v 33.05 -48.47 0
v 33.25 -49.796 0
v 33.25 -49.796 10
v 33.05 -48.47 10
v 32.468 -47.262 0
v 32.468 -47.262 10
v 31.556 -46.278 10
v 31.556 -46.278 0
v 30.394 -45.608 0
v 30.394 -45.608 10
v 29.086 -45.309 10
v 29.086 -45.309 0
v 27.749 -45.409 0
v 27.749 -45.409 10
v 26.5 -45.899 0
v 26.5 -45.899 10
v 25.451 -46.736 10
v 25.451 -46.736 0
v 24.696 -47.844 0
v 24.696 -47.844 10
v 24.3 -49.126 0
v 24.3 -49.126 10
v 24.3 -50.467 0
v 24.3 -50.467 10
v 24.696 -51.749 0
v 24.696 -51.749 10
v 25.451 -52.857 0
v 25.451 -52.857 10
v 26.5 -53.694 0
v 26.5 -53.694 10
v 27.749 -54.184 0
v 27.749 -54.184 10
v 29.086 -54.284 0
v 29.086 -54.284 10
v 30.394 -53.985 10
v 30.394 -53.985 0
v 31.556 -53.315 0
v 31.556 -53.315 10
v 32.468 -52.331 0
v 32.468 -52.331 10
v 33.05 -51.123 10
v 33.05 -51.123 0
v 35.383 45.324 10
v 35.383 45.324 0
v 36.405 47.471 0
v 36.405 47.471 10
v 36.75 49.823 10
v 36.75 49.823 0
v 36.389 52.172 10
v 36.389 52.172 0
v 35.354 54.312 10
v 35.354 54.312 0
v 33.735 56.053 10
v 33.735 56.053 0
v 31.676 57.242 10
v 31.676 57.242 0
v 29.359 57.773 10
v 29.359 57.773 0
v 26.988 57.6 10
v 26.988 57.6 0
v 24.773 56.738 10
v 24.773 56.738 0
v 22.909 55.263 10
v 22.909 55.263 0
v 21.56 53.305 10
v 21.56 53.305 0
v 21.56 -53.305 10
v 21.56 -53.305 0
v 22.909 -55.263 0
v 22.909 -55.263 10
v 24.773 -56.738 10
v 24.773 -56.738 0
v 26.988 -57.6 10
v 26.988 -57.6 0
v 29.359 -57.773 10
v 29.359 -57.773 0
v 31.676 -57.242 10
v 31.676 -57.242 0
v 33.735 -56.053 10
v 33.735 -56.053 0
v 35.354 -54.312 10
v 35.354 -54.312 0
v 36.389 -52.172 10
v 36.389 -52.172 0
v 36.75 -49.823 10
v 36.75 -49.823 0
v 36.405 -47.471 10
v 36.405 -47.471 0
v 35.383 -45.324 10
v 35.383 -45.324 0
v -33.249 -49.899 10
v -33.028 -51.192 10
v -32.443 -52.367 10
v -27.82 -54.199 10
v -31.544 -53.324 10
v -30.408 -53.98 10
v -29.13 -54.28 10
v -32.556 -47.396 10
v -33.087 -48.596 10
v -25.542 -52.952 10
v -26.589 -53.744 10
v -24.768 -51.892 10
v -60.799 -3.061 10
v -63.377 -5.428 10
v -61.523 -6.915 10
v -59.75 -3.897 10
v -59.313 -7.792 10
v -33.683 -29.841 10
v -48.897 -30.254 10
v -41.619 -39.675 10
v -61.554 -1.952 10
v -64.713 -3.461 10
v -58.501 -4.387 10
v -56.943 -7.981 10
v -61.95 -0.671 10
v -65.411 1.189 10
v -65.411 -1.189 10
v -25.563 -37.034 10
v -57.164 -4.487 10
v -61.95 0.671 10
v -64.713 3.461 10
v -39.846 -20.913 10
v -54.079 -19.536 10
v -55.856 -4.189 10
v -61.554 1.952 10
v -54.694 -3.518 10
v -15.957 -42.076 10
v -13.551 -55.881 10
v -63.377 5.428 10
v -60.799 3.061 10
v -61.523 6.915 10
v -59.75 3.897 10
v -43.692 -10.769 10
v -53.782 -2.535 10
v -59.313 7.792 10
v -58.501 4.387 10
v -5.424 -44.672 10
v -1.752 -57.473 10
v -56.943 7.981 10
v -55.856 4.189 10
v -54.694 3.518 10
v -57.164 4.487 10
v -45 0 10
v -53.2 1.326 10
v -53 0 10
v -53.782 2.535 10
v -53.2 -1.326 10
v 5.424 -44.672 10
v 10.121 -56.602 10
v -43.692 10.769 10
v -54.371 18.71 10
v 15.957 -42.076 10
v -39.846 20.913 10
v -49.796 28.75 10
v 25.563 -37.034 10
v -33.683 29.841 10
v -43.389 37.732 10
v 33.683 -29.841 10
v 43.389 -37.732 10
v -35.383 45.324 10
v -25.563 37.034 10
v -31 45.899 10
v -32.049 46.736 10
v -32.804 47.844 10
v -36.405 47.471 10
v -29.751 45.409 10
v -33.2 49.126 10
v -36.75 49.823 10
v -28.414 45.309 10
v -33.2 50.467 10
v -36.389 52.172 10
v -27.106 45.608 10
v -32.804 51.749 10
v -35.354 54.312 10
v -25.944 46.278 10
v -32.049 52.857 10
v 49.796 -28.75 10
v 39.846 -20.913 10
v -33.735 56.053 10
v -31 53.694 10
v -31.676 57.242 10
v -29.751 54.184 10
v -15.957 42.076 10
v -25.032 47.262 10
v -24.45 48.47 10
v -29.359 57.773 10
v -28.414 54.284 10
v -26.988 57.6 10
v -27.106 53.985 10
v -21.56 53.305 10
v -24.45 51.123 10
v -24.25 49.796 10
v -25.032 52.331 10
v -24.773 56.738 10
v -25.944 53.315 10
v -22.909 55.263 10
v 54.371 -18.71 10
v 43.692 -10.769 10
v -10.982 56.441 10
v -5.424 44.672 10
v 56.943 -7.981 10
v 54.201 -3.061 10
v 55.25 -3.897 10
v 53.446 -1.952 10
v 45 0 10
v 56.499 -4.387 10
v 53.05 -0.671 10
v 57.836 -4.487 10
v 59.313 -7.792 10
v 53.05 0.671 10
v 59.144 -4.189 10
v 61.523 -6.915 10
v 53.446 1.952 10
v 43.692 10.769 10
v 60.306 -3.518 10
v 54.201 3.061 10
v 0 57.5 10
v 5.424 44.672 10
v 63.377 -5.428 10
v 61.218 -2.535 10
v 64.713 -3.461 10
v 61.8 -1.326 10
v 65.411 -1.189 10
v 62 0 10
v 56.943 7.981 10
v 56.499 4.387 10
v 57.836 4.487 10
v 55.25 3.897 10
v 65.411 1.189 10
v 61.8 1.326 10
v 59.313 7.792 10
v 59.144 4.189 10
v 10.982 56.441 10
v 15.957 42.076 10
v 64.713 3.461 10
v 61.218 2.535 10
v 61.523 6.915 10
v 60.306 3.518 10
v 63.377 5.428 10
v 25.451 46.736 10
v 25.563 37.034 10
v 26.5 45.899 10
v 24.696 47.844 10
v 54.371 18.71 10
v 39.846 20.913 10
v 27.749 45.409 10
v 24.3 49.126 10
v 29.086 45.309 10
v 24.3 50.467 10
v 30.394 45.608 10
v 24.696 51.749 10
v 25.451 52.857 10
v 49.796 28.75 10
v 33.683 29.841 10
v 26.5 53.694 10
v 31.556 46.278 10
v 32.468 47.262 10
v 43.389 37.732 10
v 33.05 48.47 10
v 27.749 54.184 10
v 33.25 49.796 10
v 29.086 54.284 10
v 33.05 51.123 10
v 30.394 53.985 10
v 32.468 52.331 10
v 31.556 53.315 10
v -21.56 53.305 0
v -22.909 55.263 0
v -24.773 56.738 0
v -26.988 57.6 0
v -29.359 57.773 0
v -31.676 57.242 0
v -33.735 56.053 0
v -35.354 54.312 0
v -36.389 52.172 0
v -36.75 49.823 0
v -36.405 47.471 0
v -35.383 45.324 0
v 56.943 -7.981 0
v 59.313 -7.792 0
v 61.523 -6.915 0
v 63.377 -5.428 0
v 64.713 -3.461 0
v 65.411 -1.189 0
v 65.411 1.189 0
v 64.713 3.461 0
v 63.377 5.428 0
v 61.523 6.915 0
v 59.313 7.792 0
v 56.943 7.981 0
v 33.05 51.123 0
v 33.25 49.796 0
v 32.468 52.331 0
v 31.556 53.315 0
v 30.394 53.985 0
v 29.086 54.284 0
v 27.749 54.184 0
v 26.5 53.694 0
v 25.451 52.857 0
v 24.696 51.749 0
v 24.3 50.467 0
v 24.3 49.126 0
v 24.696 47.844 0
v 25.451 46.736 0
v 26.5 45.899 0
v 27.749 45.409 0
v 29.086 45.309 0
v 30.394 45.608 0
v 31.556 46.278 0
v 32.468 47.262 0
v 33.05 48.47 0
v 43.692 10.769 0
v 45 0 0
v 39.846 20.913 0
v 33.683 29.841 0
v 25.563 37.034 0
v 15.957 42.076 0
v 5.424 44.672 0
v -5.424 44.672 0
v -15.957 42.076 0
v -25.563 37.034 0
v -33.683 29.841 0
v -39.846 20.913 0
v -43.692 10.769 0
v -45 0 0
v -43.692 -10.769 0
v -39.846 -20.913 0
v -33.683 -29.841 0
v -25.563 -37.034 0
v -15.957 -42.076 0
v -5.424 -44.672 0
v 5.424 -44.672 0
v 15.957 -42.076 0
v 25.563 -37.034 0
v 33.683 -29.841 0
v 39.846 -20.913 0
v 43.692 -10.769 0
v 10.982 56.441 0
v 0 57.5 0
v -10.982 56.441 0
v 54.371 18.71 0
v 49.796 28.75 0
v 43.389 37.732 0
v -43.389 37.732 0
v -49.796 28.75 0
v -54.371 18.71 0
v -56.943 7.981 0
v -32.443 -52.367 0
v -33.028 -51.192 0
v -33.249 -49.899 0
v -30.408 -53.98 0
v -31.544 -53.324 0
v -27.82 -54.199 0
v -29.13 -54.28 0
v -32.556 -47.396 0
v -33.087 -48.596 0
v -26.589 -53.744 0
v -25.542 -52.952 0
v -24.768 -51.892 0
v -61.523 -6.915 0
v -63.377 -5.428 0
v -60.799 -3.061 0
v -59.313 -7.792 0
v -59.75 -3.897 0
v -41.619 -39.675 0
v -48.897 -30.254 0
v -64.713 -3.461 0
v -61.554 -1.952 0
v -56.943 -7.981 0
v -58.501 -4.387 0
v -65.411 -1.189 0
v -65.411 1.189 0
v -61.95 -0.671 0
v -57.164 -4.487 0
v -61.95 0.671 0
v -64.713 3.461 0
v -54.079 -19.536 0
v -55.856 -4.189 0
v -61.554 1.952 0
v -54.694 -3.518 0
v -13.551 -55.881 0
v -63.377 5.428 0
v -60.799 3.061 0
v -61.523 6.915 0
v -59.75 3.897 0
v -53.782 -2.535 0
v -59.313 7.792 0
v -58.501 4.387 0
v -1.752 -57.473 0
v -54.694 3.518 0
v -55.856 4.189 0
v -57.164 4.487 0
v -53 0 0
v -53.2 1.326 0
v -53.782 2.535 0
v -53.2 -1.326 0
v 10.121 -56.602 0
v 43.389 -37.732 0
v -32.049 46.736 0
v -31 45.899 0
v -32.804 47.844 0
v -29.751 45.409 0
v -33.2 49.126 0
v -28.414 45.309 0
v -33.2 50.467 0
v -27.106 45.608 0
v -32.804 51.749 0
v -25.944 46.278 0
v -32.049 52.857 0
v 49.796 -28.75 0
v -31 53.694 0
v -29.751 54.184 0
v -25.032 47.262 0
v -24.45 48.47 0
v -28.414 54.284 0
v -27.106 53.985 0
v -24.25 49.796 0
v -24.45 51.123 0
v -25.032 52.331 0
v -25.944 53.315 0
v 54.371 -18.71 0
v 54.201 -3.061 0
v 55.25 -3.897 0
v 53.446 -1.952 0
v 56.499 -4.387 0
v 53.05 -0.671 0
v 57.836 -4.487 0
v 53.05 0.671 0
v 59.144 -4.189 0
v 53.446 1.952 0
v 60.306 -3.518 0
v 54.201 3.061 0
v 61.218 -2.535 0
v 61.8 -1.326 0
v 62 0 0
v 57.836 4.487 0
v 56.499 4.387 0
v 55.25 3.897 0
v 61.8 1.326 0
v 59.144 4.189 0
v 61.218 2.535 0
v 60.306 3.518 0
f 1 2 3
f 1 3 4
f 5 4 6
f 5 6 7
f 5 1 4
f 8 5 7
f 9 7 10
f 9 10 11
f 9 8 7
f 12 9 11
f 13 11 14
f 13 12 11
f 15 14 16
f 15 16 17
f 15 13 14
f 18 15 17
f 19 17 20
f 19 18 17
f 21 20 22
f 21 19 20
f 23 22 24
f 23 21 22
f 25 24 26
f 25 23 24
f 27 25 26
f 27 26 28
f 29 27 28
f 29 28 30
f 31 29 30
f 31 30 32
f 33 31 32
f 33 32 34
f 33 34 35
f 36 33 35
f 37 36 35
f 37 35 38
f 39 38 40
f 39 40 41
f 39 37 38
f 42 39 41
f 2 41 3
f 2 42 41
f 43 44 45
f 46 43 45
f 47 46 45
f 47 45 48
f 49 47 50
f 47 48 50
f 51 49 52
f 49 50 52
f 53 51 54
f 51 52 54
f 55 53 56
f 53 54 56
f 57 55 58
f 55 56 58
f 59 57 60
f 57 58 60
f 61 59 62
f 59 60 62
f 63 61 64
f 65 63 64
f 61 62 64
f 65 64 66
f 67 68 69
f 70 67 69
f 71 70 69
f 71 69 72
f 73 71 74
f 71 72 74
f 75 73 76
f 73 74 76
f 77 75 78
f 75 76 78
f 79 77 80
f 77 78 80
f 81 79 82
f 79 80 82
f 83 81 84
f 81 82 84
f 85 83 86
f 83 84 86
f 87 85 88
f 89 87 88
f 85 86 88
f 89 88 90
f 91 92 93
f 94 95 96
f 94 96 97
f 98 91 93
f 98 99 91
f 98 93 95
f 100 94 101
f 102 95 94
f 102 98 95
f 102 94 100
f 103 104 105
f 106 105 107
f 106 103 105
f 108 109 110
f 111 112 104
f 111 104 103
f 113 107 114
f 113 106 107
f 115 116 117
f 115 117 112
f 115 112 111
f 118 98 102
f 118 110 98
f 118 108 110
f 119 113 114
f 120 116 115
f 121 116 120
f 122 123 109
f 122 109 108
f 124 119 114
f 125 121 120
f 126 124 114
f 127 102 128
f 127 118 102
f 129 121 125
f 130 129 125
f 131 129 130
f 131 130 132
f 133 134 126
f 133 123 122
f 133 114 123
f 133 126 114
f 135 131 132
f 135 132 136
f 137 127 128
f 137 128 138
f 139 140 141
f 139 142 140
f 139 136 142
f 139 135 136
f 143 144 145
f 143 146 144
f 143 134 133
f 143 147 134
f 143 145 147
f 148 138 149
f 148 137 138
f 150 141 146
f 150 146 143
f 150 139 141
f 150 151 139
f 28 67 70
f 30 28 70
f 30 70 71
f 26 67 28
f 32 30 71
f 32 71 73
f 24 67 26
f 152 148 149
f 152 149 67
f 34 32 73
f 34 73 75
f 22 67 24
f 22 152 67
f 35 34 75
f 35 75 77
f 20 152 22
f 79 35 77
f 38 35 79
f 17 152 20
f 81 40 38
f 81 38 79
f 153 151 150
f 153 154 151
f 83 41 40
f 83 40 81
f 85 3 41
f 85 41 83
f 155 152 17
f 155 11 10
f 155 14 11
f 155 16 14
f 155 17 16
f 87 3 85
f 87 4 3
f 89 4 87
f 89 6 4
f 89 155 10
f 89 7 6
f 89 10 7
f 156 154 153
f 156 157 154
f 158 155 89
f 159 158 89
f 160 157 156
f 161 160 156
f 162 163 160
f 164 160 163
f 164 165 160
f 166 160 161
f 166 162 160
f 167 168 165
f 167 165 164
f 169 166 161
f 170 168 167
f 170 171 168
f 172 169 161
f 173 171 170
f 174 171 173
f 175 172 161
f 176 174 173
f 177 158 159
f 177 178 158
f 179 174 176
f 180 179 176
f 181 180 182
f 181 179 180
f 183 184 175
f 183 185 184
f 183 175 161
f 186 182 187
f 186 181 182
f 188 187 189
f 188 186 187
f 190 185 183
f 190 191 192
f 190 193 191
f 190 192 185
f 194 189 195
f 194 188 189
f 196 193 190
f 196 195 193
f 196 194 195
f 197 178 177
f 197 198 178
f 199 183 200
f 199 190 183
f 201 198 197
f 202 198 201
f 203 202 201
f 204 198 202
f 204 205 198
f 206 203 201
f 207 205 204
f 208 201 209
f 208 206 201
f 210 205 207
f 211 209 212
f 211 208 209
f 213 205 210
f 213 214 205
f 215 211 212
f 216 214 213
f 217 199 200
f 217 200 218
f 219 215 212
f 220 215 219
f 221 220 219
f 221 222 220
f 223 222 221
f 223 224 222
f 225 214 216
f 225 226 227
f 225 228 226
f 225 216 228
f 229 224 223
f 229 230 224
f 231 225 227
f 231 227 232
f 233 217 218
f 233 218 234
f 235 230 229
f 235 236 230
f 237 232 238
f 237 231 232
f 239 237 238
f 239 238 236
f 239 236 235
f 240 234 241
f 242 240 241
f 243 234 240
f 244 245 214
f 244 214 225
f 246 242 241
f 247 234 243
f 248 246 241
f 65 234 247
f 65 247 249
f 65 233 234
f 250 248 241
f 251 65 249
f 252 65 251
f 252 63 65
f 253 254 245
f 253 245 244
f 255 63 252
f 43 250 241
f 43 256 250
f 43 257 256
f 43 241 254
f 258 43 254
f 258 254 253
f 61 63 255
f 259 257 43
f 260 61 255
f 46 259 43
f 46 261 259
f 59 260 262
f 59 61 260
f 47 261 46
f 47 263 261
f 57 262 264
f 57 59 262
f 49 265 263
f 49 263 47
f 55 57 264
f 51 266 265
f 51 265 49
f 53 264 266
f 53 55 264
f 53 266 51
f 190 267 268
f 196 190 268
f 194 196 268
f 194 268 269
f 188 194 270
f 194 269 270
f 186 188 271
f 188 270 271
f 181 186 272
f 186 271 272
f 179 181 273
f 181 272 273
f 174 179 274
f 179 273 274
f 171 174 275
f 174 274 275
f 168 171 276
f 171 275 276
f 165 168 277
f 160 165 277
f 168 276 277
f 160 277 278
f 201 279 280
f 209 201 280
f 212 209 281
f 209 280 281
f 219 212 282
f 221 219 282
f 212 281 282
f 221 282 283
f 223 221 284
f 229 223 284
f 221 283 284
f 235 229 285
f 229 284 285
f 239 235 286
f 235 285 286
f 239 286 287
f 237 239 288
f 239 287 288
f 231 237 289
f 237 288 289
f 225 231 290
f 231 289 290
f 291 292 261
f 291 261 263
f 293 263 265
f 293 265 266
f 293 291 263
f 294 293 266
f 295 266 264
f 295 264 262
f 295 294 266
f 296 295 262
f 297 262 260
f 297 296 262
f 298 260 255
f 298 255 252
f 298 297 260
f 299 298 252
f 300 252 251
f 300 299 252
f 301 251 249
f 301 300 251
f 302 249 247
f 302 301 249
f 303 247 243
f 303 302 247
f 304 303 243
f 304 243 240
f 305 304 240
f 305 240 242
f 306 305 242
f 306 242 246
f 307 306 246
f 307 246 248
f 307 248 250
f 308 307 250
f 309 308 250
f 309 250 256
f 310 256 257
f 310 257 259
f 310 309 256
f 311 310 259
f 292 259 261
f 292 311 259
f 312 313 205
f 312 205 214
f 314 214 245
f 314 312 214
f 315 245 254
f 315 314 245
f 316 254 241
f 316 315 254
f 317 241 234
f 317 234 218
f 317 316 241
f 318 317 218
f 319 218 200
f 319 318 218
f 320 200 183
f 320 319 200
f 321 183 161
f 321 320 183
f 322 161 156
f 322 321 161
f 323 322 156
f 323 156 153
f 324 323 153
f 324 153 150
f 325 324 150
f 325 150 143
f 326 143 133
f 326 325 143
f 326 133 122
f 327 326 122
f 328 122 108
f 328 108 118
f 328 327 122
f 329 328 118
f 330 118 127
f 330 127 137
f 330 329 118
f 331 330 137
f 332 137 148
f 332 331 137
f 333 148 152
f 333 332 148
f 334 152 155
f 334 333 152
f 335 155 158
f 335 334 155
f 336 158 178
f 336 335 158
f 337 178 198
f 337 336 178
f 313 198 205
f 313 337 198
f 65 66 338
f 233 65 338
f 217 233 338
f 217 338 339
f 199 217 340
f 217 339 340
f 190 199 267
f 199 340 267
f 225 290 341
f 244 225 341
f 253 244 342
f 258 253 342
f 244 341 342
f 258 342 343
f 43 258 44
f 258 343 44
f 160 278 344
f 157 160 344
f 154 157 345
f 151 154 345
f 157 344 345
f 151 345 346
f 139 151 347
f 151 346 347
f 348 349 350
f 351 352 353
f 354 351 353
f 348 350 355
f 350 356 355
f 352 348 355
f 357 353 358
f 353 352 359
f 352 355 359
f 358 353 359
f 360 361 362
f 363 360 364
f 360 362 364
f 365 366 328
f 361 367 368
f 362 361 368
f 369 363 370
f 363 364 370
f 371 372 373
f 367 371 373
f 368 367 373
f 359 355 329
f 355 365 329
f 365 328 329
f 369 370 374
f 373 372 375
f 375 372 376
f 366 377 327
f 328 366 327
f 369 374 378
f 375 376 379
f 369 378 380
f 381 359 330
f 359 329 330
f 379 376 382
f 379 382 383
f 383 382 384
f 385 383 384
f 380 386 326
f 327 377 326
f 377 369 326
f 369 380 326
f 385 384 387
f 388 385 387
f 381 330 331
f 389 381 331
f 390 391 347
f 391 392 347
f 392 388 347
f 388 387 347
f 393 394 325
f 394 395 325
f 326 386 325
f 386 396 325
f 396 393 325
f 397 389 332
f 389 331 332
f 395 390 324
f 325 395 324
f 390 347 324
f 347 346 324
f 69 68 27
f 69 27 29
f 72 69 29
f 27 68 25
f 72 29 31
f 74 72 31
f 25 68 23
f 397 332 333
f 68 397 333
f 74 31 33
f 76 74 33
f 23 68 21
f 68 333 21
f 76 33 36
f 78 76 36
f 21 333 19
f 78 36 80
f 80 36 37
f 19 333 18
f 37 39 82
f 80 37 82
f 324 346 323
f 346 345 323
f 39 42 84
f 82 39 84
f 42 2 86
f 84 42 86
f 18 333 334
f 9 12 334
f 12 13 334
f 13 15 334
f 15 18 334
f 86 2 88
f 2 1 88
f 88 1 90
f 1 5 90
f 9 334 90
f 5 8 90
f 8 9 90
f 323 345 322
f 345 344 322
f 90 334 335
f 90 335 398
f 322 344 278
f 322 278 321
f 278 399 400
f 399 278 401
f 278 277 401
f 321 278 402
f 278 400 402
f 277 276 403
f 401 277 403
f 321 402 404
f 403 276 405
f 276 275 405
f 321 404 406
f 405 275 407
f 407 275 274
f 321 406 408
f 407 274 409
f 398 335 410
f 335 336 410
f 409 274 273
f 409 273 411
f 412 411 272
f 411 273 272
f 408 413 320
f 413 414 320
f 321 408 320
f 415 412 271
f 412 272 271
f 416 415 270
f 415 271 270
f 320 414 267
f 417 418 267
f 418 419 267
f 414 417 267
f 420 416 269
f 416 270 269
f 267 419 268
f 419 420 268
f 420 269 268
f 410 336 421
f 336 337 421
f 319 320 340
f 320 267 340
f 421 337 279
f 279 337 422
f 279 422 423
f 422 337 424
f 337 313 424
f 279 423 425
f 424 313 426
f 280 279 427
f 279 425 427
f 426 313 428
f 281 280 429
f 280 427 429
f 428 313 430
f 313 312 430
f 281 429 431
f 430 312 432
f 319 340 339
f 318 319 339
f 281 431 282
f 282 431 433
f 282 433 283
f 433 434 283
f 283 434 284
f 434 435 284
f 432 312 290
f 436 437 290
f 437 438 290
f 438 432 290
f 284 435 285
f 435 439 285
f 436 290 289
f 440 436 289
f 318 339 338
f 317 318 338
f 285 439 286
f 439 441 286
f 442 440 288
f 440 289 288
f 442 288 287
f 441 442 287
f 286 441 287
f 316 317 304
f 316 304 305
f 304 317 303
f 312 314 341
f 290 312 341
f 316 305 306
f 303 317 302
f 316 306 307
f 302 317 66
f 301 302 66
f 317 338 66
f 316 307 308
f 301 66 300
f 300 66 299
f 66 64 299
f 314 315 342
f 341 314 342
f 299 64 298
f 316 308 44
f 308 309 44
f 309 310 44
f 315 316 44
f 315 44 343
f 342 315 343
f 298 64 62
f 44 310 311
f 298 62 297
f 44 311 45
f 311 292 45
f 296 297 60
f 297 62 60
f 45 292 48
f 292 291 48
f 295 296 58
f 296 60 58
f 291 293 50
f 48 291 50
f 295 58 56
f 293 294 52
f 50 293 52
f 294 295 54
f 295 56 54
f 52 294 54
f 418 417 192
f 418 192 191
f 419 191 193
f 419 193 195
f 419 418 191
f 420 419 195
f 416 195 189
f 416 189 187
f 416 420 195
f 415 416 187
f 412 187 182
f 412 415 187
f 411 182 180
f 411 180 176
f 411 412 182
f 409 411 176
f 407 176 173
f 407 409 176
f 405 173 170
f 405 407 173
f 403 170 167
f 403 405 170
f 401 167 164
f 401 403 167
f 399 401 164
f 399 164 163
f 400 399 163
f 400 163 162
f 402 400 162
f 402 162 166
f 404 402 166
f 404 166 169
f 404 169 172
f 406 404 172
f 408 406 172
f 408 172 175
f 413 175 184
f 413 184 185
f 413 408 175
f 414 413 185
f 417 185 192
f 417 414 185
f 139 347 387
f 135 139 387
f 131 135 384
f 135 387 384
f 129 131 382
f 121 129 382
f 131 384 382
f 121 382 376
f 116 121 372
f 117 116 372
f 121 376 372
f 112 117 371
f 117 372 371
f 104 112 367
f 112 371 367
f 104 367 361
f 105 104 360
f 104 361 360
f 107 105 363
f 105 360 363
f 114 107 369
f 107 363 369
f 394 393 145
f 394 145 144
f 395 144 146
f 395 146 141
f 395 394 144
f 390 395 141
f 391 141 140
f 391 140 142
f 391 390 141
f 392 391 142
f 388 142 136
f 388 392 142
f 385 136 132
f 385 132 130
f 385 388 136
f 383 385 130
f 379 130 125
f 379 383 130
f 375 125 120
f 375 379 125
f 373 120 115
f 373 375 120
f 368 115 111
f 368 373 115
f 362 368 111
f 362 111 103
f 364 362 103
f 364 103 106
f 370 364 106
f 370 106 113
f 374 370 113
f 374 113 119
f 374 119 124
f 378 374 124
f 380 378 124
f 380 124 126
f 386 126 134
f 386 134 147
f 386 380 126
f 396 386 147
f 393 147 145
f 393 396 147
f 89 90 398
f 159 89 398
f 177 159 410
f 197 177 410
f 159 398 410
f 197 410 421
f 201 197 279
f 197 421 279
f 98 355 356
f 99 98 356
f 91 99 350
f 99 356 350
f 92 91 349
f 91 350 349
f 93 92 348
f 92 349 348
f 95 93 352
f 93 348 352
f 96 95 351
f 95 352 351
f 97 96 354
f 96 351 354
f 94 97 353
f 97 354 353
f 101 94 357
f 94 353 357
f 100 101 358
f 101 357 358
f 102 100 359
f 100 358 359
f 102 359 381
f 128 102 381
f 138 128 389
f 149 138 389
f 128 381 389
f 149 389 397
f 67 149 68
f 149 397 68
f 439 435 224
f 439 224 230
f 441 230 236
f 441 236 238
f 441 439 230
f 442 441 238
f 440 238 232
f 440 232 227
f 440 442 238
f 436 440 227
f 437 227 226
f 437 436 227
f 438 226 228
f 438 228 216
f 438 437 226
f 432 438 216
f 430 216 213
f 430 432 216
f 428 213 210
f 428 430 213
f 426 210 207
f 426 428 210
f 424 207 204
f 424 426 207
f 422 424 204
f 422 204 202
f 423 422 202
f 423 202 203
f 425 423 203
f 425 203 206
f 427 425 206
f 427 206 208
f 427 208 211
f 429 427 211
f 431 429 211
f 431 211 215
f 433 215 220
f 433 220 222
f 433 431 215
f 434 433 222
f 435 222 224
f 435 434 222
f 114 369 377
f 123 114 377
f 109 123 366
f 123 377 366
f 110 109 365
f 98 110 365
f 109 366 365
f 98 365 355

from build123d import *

# Parameters (mm, degrees)
SKETCH1_R           = 4.5
SKETCH1_R_2         = 45
BOSS_EXTRUDE1_DEPTH = 10


with BuildPart() as part:
    # Sketch1 → Boss-Extrude1 (new body)
    with BuildSketch(Plane.XY):
        with BuildLine():
            ThreePointArc((56.943478261, -7.980619246), (65.5, 0), (56.943478261, 7.980619246))
            ThreePointArc((56.943478261, 7.980619246), (49.796460718, 28.75), (35.383158136, 45.324189131))
            ThreePointArc((35.383158136, 45.324189131), (32.75, 56.724663948), (21.560320125, 53.304808377))
            ThreePointArc((21.560320125, 53.304808377), (0, 57.5), (-21.560320125, 53.304808377))
            ThreePointArc((-21.560320125, 53.304808377), (-32.75, 56.724663948), (-35.383158136, 45.324189131))
            ThreePointArc((-35.383158136, 45.324189131), (-49.796460718, 28.75), (-56.943478261, 7.980619246))
            ThreePointArc((-56.943478261, 7.980619246), (-65.5, 0), (-56.943478261, -7.980619246))
            ThreePointArc((-56.943478261, -7.980619246), (-48.897136106, -30.254257231), (-32.556086083, -47.39568819))
            ThreePointArc((-32.556086083, -47.39568819), (-31, -53.693575035), (-24.767826961, -51.89224169))
            ThreePointArc((-24.767826961, -51.89224169), (-1.752387282, -57.473290656), (21.560320125, -53.304808377))
            ThreePointArc((21.560320125, -53.304808377), (32.75, -56.724663948), (35.383158136, -45.324189131))
            ThreePointArc((35.383158136, -45.324189131), (49.796460718, -28.75), (56.943478261, -7.980619246))
        make_face()
        with Locations((57.5, 0)):
            Circle(SKETCH1_R, mode=Mode.SUBTRACT)
        with Locations((-57.5, 0)):
            Circle(SKETCH1_R, mode=Mode.SUBTRACT)
        with Locations((-28.75, 49.796460718)):
            Circle(SKETCH1_R, mode=Mode.SUBTRACT)
        with Locations((28.75, 49.796460718)):
            Circle(SKETCH1_R, mode=Mode.SUBTRACT)
        Circle(SKETCH1_R_2, mode=Mode.SUBTRACT)
        with Locations((28.75, -49.796460718)):
            Circle(SKETCH1_R, mode=Mode.SUBTRACT)
    extrude(amount=BOSS_EXTRUDE1_DEPTH)


solid = part.part
